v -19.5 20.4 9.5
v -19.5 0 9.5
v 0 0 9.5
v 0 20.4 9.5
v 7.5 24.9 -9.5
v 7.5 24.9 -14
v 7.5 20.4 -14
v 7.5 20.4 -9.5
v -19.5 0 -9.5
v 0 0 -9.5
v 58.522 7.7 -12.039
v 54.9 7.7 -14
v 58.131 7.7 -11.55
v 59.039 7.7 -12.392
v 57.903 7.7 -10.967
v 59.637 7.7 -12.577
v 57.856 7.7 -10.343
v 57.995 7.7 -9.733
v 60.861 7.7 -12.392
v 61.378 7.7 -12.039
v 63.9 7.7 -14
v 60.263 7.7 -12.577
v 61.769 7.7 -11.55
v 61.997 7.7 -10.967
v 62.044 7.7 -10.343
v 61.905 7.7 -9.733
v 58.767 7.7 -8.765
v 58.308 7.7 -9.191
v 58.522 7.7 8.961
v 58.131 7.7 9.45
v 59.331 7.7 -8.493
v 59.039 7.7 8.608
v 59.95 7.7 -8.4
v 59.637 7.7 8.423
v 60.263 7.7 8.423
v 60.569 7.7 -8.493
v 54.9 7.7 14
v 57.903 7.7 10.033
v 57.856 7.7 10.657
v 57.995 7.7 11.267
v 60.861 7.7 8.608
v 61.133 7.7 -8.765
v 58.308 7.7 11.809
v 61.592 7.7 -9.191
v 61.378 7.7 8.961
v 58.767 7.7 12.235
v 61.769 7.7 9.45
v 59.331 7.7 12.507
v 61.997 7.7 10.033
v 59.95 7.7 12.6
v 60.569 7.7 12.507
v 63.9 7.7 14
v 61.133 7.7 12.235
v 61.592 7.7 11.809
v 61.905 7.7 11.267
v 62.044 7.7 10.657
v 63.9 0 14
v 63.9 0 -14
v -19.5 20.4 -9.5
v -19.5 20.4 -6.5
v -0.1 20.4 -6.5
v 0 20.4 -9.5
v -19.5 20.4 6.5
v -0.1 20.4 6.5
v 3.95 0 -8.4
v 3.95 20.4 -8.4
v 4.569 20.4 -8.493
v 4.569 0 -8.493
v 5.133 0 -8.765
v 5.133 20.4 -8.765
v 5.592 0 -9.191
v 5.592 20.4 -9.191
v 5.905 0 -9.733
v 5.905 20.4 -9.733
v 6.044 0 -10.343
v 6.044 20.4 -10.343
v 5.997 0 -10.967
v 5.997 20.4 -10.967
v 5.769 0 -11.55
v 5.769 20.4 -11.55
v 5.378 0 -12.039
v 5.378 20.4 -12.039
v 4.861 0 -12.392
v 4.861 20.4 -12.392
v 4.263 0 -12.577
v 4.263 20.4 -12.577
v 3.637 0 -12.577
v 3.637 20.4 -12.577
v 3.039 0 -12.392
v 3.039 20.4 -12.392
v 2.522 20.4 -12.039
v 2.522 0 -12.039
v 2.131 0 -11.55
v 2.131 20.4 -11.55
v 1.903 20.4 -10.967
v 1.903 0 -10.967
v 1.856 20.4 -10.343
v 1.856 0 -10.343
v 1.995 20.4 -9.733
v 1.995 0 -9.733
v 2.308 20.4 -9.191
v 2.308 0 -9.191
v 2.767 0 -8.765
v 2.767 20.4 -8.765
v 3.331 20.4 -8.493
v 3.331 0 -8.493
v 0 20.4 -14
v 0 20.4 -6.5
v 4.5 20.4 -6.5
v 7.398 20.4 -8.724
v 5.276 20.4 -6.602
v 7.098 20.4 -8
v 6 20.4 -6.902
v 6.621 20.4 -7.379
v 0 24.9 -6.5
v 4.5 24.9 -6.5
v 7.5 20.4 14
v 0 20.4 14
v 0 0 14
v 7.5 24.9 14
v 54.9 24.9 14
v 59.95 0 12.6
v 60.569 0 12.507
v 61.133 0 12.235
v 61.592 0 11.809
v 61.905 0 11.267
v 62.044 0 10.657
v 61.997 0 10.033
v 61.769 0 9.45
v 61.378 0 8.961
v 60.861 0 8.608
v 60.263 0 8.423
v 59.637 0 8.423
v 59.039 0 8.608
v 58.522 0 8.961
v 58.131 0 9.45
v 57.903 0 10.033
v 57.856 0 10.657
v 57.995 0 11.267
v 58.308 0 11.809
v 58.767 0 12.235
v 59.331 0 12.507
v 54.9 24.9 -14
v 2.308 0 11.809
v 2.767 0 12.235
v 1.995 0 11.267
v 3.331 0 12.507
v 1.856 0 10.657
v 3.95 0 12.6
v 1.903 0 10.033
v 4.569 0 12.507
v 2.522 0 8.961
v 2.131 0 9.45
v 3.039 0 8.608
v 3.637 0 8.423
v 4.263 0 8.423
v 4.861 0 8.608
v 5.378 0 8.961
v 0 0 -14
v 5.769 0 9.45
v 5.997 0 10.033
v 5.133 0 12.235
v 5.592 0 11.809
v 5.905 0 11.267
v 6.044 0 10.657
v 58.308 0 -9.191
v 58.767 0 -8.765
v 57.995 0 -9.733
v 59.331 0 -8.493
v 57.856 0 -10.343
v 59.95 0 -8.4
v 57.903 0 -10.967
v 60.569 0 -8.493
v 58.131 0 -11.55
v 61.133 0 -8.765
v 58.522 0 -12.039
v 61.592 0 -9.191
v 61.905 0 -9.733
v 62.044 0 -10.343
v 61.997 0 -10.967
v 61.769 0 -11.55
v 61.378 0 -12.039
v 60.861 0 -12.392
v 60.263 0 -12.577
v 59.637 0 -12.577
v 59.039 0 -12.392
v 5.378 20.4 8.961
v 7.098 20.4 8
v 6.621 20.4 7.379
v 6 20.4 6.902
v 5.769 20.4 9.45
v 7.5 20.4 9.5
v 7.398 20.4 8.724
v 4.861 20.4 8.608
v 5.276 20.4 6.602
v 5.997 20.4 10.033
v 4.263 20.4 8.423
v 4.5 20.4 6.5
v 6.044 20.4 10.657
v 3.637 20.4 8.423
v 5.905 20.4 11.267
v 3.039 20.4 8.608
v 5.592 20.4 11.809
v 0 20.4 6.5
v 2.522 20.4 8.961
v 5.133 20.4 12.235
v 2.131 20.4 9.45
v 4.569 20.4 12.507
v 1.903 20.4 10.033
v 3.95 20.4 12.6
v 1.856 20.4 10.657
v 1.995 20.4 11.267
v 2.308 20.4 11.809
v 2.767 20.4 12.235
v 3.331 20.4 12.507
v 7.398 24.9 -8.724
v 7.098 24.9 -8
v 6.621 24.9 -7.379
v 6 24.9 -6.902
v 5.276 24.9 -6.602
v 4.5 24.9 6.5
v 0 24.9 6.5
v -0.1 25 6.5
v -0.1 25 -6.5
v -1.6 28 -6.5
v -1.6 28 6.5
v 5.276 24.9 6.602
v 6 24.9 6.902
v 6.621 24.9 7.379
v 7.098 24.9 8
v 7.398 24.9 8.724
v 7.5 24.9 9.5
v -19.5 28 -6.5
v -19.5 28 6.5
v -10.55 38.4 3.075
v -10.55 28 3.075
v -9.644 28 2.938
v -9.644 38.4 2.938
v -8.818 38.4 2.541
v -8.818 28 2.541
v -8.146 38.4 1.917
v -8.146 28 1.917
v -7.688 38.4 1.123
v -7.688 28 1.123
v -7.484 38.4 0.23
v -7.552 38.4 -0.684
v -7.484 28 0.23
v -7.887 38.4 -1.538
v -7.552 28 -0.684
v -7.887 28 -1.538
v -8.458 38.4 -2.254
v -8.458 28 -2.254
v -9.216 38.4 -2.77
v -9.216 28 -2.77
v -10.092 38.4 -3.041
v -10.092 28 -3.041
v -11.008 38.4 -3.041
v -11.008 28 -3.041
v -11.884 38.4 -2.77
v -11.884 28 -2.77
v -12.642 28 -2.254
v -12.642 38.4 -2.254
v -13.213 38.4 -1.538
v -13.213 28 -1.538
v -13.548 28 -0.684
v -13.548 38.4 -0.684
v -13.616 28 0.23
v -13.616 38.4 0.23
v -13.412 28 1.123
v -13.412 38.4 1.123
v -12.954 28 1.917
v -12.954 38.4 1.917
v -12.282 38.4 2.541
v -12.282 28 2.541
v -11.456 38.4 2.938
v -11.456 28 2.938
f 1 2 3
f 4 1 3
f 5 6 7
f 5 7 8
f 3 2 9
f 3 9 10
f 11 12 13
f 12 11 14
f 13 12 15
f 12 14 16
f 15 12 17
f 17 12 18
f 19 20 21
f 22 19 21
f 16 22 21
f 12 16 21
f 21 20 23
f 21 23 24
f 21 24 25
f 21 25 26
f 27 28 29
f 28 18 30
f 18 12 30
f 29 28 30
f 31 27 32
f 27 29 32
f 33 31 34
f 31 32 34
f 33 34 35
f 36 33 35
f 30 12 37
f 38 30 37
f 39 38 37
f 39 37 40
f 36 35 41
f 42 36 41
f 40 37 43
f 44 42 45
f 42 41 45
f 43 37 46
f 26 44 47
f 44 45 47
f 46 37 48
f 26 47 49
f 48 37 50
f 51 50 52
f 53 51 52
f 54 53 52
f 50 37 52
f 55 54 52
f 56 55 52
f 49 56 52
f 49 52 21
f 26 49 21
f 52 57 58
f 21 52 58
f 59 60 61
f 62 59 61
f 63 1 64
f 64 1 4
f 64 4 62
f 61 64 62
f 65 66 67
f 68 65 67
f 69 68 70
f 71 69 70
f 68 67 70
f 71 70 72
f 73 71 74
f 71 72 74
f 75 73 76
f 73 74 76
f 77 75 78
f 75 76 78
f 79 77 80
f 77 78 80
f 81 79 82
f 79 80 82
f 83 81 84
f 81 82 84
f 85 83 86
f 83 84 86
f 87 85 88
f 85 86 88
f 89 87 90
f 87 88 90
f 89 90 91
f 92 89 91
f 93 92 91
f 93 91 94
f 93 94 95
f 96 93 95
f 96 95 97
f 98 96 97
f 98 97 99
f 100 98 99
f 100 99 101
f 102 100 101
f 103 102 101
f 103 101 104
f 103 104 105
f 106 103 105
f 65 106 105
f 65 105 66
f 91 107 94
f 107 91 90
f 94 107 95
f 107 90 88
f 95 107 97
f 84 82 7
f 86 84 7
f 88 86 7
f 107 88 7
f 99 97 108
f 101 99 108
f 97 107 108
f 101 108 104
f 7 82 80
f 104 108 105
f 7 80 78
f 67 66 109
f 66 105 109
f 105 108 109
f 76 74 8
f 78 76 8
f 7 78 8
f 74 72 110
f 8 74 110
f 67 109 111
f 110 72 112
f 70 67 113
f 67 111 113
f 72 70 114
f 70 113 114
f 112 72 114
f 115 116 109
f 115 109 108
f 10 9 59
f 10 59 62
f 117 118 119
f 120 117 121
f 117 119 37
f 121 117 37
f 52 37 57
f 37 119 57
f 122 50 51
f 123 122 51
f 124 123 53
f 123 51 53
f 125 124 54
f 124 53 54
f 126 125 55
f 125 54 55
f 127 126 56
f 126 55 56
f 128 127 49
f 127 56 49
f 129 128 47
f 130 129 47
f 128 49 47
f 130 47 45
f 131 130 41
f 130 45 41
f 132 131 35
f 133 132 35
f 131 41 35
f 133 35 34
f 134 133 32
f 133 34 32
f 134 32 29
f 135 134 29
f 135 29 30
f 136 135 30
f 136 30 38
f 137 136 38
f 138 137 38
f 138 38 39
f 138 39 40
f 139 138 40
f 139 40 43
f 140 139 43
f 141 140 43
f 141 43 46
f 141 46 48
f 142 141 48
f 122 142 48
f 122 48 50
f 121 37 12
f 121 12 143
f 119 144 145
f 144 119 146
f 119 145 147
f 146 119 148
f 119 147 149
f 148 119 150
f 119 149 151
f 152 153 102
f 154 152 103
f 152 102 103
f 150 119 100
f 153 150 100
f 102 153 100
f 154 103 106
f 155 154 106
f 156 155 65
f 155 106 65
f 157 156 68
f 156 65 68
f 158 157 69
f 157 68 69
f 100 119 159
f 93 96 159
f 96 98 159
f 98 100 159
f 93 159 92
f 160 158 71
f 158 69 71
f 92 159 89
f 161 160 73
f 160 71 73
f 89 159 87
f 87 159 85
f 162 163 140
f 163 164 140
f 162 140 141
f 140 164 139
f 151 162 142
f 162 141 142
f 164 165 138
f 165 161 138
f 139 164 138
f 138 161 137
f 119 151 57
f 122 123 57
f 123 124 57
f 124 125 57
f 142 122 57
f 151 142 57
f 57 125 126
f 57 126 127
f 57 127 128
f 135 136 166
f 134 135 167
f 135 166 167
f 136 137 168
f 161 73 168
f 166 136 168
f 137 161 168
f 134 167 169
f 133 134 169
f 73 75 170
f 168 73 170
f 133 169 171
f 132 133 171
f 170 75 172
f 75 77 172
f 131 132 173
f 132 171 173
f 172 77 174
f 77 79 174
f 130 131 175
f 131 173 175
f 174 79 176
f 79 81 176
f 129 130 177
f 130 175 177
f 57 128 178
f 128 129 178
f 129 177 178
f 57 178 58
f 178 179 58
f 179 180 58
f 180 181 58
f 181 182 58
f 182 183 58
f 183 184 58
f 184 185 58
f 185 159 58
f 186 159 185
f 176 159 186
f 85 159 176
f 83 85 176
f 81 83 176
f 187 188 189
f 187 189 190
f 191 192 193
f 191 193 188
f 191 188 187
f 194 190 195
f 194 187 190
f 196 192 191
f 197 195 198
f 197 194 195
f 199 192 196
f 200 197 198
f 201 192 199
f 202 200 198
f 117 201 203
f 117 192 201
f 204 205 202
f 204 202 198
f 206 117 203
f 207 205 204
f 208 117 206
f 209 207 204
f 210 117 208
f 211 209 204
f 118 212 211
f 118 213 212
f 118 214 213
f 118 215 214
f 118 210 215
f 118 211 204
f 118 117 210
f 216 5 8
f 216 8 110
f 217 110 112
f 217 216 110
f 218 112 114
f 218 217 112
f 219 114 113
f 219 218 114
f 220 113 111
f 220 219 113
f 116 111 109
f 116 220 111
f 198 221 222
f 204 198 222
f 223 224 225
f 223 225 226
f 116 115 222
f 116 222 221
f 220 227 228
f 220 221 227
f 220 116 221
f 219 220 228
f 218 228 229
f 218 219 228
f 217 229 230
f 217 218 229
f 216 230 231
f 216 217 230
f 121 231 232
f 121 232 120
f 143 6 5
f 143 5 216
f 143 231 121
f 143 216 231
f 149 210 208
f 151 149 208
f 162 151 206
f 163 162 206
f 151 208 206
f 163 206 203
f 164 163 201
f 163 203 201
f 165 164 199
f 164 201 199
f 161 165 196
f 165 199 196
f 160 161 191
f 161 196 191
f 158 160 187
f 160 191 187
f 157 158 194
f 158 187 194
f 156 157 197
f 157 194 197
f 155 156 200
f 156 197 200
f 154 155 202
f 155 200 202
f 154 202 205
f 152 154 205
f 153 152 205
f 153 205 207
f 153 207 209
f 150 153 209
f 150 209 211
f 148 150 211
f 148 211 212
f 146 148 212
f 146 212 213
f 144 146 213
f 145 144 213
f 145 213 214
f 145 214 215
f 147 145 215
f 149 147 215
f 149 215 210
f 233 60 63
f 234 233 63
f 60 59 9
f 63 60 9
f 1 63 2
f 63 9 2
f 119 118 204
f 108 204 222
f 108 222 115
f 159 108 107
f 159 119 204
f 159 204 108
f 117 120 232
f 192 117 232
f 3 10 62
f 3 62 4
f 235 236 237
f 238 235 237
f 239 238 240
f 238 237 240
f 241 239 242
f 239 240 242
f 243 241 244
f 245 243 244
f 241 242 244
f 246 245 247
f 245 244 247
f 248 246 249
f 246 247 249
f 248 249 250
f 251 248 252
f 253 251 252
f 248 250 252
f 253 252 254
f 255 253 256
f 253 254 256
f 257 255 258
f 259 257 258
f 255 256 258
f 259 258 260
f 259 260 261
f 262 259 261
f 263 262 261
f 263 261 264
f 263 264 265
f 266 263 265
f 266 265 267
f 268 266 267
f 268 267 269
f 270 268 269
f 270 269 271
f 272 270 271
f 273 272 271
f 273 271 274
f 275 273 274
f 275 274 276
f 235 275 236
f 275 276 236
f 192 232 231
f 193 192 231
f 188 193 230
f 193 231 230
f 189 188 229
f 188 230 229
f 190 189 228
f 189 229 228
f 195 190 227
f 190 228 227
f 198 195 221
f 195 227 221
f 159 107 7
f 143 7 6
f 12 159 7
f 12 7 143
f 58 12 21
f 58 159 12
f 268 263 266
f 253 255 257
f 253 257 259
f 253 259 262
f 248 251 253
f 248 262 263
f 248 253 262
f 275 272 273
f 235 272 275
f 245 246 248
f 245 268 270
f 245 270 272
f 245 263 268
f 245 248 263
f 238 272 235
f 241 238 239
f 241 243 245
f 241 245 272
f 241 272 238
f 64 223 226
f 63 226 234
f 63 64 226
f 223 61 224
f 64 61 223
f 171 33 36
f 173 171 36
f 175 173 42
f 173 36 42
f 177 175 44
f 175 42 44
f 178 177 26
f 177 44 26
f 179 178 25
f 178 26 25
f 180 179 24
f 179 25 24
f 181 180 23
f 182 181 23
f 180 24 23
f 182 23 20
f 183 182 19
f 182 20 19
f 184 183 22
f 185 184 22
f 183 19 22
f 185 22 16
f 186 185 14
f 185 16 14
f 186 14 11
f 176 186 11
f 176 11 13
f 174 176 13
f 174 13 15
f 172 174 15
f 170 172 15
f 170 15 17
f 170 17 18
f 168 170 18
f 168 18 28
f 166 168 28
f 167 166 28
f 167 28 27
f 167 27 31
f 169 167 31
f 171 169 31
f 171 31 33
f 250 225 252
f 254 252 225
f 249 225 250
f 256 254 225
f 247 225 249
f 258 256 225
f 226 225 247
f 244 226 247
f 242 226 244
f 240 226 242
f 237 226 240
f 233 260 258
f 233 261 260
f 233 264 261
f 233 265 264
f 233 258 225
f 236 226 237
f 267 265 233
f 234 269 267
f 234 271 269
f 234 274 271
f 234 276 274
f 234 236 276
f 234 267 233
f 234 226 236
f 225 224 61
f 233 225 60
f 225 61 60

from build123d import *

# Parameters (mm, degrees)
SKETCH1_W             = 63.9
SKETCH1_H             = 28
EXTRUDE1_DEPTH        = 24.9
SKETCH2_W             = 9
SKETCH2_H             = 17.2
CUT_EXTRUDE1_DEPTH    = 75.075772018
CUT_EXTRUDE2_DEPTH    = 4.5
M5X0_8_TAPPED_HOLE4_D = 4.2
SKETCH11_W            = 19.5
SKETCH11_H            = 19
EXTRUDE2_DEPTH        = 20.4
SKETCH12_W            = 19.4
SKETCH12_H            = 13
EXTRUDE4_DEPTH        = 7.6
CHAMFER1_SIZE         = 1.5
CHAMFER1_SIZE2        = 3
SKETCH13_R            = 3.075
EXTRUDE5_DEPTH        = 10.4


with BuildPart() as part:
    # Sketch1 → Extrude1 (new body)
    with BuildSketch(Plane(origin=(0, 0, 0), x_dir=(1, 0, 0), z_dir=(0, 1, 0))):
        with Locations((31.95, 0)):
            Rectangle(SKETCH1_W, SKETCH1_H)
    extrude(amount=EXTRUDE1_DEPTH)

    # Sketch2 → Cut-Extrude1 (cut, through all)
    with BuildSketch(Plane.XY.offset(14)):
        with Locations((59.4, 16.3)):
            Rectangle(SKETCH2_W, SKETCH2_H)
    extrude(amount=-CUT_EXTRUDE1_DEPTH, mode=Mode.SUBTRACT)

    # Sketch3 → Cut-Extrude2 (cut)
    with BuildSketch(Plane(origin=(0, 24.9, 0), x_dir=(-1, 0, 0), z_dir=(0, 1, 0))):
        with BuildLine():
            Line((-7.5, -14), (-7.5, -9.5))
            ThreePointArc((-7.5, -9.5), (-6.621320344, -7.378679656), (-4.5, -6.5))
            Line((-4.5, -6.5), (0, -6.5))
            Line((0, -6.5), (0, -14))
            Line((0, -14), (-7.5, -14))
        make_face()
        with BuildLine():
            Line((0, 14), (-7.5, 14))
            Line((-7.5, 14), (-7.5, 9.5))
            ThreePointArc((-7.5, 9.5), (-6.621320344, 7.378679656), (-4.5, 6.5))
            Line((-4.5, 6.5), (0, 6.5))
            Line((0, 6.5), (0, 14))
        make_face()
    extrude(amount=-CUT_EXTRUDE2_DEPTH, mode=Mode.SUBTRACT)

    # M5x0.8 Tapped Hole4 (through all)
    with Locations(Plane(origin=(3.95, 0, 10.5), x_dir=(0, 0, -1), z_dir=(0, -1, 0))):
        with Locations((0, 0), (21, 0), (0, 56), (21, 56)):
            Hole(M5X0_8_TAPPED_HOLE4_D / 2)


with BuildPart() as body_2:
    # Sketch11 → Extrude2 (new body)
    with BuildSketch(Plane.XZ):
        with Locations((-9.75, 0)):
            Rectangle(SKETCH11_W, SKETCH11_H)
    extrude(amount=-EXTRUDE2_DEPTH)

    # Sketch12 → Extrude4 (add)
    with BuildSketch(Plane(origin=(0, 20.4, 0), x_dir=(-1, 0, 0), z_dir=(0, 1, 0))):
        with Locations((9.8, 0)):
            Rectangle(SKETCH12_W, SKETCH12_H)
    extrude(amount=EXTRUDE4_DEPTH)

    # Chamfer1
    chamfer1_edges = [body_2.edges().sort_by_distance(p)[0] for p in [
        (-0.1, 28, 0),
    ]]
    chamfer1_side = [body_2.faces().sort_by_distance(p)[0] for p in [
        (-9.8, 28, 0),
    ]]
    chamfer(chamfer1_edges, length=CHAMFER1_SIZE, length2=CHAMFER1_SIZE2, reference=chamfer1_side[0])

    # Sketch13 → Extrude5 (add)
    with BuildSketch(Plane(origin=(0, 28, 0), x_dir=(-1, 0, 0), z_dir=(0, 1, 0))):
        with Locations(Location((10.55, 0, 0), (0, 0, 90))):
            Circle(SKETCH13_R)
    extrude(amount=EXTRUDE5_DEPTH)


solid = Compound([part.part, body_2.part])
